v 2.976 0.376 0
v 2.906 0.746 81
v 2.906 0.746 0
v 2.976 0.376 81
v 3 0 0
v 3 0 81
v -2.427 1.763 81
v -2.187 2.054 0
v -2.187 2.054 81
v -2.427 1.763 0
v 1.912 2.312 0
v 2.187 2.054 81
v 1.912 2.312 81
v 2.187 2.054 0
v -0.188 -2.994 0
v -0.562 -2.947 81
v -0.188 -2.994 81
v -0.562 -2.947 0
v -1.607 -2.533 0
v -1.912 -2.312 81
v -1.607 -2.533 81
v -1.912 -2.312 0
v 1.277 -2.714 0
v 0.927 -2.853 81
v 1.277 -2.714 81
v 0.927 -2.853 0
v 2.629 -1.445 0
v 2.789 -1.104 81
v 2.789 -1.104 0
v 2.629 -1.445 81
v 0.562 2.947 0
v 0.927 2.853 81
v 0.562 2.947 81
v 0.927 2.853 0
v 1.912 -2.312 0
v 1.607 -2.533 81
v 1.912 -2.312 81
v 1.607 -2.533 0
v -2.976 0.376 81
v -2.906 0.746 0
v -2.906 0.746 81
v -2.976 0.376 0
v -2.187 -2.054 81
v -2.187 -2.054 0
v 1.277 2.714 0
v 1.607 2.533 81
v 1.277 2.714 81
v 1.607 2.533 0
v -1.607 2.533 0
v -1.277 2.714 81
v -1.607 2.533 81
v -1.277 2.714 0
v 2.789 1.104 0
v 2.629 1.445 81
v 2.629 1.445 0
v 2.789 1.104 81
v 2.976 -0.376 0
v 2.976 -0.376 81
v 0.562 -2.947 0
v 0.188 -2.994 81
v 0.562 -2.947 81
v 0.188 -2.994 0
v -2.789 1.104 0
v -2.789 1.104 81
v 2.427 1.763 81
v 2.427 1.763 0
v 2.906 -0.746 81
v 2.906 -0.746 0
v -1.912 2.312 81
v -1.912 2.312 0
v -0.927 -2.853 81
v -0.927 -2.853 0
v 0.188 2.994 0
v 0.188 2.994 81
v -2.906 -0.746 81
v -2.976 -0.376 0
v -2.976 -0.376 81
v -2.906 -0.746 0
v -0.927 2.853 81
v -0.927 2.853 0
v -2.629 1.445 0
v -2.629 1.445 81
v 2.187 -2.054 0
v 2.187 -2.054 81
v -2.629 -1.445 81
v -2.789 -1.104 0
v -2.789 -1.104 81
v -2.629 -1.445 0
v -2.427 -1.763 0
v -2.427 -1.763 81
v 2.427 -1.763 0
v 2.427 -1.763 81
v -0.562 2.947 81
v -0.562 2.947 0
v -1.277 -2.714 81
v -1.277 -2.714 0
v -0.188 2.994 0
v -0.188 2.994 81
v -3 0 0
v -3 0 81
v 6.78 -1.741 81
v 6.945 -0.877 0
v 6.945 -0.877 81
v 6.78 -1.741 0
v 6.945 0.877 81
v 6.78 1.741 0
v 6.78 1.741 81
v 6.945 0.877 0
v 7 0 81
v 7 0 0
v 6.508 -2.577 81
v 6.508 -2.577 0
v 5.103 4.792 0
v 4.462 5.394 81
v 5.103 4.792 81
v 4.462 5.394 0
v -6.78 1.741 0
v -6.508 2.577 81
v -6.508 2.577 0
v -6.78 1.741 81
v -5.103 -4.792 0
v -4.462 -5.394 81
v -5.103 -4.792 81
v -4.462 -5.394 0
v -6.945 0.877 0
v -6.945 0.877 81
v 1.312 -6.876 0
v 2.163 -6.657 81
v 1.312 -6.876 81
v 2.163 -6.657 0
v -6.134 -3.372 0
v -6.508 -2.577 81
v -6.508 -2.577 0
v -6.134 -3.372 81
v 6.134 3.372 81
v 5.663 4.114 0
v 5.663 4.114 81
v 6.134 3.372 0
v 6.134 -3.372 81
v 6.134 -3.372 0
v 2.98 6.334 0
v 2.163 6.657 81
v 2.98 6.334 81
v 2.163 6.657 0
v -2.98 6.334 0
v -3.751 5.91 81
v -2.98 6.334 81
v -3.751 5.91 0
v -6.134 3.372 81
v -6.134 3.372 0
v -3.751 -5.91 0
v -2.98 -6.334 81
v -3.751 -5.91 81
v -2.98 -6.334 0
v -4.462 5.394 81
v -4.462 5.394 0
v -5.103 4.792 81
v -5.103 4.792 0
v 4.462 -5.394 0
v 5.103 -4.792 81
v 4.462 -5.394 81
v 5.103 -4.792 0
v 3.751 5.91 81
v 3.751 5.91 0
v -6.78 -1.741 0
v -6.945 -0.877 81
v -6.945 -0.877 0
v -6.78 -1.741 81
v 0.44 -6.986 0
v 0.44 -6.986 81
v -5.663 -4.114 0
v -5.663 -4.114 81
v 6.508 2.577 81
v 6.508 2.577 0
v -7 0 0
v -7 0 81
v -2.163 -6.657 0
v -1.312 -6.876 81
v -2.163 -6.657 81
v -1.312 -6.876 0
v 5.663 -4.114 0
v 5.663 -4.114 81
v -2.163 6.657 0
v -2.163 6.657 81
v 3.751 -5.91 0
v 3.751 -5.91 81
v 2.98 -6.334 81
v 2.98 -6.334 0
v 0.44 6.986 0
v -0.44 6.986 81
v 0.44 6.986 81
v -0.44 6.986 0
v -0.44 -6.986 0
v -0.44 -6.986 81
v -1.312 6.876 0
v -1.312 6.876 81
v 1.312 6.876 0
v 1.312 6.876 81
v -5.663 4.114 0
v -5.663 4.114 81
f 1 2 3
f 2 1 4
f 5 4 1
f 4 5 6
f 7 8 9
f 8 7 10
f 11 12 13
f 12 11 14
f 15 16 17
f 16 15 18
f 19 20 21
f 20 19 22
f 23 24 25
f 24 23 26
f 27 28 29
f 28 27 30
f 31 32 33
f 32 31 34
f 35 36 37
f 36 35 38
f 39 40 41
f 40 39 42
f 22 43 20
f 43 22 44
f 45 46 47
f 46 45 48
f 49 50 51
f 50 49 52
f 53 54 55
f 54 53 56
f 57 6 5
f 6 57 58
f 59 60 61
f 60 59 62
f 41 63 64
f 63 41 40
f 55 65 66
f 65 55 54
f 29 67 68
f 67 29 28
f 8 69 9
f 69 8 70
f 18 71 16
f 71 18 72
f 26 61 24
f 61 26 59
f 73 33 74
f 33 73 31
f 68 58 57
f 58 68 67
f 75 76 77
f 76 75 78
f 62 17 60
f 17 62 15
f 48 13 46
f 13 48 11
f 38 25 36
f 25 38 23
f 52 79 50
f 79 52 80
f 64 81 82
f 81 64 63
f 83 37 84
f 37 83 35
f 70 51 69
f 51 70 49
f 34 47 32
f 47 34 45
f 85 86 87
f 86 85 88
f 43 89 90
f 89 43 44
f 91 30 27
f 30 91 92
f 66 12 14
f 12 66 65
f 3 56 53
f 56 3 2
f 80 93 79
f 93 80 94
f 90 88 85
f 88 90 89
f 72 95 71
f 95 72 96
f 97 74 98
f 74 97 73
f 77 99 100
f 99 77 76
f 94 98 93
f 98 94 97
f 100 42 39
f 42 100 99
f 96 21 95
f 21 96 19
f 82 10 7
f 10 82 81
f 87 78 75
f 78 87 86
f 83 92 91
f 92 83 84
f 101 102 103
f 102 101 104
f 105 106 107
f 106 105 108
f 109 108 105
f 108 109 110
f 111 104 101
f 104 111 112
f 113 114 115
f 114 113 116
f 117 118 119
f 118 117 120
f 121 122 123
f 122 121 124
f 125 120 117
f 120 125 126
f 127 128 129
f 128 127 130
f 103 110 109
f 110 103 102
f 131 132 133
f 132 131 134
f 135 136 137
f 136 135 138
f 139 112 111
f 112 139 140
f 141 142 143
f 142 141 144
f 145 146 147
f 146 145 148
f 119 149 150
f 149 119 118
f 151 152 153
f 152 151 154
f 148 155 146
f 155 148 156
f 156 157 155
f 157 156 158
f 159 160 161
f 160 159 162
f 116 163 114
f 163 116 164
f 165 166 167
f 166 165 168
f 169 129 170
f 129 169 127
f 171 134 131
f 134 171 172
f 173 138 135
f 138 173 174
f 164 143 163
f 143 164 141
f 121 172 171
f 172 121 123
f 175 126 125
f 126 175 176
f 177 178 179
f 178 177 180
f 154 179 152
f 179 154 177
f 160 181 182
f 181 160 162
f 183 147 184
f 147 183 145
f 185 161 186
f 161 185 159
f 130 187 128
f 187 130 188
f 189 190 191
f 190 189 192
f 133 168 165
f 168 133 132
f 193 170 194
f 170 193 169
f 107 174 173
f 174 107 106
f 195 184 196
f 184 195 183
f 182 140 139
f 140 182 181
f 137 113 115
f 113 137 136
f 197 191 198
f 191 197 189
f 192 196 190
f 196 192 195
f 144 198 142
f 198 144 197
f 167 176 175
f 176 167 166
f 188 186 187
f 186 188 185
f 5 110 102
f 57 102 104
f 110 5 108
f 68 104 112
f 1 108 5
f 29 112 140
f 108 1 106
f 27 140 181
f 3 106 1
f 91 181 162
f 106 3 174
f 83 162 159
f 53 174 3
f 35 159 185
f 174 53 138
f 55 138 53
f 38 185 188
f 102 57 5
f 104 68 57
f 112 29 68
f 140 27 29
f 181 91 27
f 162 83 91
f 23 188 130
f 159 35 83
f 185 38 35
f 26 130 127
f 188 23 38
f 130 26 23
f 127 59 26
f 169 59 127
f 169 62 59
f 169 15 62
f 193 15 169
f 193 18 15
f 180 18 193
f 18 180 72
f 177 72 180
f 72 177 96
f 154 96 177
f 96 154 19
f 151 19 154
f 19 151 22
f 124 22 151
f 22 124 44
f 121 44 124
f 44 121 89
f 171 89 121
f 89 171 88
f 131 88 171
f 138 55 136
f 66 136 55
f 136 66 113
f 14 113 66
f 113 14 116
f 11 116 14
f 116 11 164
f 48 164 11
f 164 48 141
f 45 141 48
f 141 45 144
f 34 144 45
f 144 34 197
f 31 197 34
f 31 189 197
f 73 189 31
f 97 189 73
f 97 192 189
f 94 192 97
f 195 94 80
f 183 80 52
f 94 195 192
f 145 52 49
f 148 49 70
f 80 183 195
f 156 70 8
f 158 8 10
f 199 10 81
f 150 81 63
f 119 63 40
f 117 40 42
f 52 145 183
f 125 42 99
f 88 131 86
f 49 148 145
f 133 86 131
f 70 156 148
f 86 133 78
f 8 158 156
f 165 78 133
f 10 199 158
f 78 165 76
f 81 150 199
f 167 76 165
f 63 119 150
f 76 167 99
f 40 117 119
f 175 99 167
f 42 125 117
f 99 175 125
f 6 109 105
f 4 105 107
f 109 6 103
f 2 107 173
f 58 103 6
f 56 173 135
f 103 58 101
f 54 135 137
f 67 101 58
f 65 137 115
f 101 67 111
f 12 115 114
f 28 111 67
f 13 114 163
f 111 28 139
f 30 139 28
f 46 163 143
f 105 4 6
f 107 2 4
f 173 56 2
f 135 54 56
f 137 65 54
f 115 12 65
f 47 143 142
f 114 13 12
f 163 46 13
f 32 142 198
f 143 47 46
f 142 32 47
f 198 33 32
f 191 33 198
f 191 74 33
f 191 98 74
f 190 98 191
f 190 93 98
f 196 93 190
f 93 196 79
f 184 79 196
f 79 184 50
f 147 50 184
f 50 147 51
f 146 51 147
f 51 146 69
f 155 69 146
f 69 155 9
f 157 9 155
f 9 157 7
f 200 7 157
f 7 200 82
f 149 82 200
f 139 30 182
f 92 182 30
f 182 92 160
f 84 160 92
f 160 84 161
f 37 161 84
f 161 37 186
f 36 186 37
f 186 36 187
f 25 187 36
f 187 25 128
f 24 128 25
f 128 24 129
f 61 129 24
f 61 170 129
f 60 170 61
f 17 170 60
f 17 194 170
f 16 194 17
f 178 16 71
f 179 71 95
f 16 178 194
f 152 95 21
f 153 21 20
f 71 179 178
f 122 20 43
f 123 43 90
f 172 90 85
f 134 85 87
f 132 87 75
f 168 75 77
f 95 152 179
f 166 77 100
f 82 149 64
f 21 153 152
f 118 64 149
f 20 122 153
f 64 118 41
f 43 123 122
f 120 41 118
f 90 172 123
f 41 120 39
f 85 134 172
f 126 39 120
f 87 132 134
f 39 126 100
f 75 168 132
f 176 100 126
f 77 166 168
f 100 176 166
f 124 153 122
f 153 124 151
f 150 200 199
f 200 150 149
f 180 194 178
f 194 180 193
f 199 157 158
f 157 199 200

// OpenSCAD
$fn = 50;


difference() {
	union() {
		cylinder(h = 81, r = 7.0000000000);
	}
	union() {
		translate(v = [0.0000000000, 0.0000000000, -100.0000000000]) {
			cylinder(h = 200, r = 3.0000000000);
		}
		cylinder(h = 81, r = 1.5000000000);
		cylinder(h = 81, r = 1.5000000000);
		cylinder(h = 81, r = 1.5000000000);
	}
}
